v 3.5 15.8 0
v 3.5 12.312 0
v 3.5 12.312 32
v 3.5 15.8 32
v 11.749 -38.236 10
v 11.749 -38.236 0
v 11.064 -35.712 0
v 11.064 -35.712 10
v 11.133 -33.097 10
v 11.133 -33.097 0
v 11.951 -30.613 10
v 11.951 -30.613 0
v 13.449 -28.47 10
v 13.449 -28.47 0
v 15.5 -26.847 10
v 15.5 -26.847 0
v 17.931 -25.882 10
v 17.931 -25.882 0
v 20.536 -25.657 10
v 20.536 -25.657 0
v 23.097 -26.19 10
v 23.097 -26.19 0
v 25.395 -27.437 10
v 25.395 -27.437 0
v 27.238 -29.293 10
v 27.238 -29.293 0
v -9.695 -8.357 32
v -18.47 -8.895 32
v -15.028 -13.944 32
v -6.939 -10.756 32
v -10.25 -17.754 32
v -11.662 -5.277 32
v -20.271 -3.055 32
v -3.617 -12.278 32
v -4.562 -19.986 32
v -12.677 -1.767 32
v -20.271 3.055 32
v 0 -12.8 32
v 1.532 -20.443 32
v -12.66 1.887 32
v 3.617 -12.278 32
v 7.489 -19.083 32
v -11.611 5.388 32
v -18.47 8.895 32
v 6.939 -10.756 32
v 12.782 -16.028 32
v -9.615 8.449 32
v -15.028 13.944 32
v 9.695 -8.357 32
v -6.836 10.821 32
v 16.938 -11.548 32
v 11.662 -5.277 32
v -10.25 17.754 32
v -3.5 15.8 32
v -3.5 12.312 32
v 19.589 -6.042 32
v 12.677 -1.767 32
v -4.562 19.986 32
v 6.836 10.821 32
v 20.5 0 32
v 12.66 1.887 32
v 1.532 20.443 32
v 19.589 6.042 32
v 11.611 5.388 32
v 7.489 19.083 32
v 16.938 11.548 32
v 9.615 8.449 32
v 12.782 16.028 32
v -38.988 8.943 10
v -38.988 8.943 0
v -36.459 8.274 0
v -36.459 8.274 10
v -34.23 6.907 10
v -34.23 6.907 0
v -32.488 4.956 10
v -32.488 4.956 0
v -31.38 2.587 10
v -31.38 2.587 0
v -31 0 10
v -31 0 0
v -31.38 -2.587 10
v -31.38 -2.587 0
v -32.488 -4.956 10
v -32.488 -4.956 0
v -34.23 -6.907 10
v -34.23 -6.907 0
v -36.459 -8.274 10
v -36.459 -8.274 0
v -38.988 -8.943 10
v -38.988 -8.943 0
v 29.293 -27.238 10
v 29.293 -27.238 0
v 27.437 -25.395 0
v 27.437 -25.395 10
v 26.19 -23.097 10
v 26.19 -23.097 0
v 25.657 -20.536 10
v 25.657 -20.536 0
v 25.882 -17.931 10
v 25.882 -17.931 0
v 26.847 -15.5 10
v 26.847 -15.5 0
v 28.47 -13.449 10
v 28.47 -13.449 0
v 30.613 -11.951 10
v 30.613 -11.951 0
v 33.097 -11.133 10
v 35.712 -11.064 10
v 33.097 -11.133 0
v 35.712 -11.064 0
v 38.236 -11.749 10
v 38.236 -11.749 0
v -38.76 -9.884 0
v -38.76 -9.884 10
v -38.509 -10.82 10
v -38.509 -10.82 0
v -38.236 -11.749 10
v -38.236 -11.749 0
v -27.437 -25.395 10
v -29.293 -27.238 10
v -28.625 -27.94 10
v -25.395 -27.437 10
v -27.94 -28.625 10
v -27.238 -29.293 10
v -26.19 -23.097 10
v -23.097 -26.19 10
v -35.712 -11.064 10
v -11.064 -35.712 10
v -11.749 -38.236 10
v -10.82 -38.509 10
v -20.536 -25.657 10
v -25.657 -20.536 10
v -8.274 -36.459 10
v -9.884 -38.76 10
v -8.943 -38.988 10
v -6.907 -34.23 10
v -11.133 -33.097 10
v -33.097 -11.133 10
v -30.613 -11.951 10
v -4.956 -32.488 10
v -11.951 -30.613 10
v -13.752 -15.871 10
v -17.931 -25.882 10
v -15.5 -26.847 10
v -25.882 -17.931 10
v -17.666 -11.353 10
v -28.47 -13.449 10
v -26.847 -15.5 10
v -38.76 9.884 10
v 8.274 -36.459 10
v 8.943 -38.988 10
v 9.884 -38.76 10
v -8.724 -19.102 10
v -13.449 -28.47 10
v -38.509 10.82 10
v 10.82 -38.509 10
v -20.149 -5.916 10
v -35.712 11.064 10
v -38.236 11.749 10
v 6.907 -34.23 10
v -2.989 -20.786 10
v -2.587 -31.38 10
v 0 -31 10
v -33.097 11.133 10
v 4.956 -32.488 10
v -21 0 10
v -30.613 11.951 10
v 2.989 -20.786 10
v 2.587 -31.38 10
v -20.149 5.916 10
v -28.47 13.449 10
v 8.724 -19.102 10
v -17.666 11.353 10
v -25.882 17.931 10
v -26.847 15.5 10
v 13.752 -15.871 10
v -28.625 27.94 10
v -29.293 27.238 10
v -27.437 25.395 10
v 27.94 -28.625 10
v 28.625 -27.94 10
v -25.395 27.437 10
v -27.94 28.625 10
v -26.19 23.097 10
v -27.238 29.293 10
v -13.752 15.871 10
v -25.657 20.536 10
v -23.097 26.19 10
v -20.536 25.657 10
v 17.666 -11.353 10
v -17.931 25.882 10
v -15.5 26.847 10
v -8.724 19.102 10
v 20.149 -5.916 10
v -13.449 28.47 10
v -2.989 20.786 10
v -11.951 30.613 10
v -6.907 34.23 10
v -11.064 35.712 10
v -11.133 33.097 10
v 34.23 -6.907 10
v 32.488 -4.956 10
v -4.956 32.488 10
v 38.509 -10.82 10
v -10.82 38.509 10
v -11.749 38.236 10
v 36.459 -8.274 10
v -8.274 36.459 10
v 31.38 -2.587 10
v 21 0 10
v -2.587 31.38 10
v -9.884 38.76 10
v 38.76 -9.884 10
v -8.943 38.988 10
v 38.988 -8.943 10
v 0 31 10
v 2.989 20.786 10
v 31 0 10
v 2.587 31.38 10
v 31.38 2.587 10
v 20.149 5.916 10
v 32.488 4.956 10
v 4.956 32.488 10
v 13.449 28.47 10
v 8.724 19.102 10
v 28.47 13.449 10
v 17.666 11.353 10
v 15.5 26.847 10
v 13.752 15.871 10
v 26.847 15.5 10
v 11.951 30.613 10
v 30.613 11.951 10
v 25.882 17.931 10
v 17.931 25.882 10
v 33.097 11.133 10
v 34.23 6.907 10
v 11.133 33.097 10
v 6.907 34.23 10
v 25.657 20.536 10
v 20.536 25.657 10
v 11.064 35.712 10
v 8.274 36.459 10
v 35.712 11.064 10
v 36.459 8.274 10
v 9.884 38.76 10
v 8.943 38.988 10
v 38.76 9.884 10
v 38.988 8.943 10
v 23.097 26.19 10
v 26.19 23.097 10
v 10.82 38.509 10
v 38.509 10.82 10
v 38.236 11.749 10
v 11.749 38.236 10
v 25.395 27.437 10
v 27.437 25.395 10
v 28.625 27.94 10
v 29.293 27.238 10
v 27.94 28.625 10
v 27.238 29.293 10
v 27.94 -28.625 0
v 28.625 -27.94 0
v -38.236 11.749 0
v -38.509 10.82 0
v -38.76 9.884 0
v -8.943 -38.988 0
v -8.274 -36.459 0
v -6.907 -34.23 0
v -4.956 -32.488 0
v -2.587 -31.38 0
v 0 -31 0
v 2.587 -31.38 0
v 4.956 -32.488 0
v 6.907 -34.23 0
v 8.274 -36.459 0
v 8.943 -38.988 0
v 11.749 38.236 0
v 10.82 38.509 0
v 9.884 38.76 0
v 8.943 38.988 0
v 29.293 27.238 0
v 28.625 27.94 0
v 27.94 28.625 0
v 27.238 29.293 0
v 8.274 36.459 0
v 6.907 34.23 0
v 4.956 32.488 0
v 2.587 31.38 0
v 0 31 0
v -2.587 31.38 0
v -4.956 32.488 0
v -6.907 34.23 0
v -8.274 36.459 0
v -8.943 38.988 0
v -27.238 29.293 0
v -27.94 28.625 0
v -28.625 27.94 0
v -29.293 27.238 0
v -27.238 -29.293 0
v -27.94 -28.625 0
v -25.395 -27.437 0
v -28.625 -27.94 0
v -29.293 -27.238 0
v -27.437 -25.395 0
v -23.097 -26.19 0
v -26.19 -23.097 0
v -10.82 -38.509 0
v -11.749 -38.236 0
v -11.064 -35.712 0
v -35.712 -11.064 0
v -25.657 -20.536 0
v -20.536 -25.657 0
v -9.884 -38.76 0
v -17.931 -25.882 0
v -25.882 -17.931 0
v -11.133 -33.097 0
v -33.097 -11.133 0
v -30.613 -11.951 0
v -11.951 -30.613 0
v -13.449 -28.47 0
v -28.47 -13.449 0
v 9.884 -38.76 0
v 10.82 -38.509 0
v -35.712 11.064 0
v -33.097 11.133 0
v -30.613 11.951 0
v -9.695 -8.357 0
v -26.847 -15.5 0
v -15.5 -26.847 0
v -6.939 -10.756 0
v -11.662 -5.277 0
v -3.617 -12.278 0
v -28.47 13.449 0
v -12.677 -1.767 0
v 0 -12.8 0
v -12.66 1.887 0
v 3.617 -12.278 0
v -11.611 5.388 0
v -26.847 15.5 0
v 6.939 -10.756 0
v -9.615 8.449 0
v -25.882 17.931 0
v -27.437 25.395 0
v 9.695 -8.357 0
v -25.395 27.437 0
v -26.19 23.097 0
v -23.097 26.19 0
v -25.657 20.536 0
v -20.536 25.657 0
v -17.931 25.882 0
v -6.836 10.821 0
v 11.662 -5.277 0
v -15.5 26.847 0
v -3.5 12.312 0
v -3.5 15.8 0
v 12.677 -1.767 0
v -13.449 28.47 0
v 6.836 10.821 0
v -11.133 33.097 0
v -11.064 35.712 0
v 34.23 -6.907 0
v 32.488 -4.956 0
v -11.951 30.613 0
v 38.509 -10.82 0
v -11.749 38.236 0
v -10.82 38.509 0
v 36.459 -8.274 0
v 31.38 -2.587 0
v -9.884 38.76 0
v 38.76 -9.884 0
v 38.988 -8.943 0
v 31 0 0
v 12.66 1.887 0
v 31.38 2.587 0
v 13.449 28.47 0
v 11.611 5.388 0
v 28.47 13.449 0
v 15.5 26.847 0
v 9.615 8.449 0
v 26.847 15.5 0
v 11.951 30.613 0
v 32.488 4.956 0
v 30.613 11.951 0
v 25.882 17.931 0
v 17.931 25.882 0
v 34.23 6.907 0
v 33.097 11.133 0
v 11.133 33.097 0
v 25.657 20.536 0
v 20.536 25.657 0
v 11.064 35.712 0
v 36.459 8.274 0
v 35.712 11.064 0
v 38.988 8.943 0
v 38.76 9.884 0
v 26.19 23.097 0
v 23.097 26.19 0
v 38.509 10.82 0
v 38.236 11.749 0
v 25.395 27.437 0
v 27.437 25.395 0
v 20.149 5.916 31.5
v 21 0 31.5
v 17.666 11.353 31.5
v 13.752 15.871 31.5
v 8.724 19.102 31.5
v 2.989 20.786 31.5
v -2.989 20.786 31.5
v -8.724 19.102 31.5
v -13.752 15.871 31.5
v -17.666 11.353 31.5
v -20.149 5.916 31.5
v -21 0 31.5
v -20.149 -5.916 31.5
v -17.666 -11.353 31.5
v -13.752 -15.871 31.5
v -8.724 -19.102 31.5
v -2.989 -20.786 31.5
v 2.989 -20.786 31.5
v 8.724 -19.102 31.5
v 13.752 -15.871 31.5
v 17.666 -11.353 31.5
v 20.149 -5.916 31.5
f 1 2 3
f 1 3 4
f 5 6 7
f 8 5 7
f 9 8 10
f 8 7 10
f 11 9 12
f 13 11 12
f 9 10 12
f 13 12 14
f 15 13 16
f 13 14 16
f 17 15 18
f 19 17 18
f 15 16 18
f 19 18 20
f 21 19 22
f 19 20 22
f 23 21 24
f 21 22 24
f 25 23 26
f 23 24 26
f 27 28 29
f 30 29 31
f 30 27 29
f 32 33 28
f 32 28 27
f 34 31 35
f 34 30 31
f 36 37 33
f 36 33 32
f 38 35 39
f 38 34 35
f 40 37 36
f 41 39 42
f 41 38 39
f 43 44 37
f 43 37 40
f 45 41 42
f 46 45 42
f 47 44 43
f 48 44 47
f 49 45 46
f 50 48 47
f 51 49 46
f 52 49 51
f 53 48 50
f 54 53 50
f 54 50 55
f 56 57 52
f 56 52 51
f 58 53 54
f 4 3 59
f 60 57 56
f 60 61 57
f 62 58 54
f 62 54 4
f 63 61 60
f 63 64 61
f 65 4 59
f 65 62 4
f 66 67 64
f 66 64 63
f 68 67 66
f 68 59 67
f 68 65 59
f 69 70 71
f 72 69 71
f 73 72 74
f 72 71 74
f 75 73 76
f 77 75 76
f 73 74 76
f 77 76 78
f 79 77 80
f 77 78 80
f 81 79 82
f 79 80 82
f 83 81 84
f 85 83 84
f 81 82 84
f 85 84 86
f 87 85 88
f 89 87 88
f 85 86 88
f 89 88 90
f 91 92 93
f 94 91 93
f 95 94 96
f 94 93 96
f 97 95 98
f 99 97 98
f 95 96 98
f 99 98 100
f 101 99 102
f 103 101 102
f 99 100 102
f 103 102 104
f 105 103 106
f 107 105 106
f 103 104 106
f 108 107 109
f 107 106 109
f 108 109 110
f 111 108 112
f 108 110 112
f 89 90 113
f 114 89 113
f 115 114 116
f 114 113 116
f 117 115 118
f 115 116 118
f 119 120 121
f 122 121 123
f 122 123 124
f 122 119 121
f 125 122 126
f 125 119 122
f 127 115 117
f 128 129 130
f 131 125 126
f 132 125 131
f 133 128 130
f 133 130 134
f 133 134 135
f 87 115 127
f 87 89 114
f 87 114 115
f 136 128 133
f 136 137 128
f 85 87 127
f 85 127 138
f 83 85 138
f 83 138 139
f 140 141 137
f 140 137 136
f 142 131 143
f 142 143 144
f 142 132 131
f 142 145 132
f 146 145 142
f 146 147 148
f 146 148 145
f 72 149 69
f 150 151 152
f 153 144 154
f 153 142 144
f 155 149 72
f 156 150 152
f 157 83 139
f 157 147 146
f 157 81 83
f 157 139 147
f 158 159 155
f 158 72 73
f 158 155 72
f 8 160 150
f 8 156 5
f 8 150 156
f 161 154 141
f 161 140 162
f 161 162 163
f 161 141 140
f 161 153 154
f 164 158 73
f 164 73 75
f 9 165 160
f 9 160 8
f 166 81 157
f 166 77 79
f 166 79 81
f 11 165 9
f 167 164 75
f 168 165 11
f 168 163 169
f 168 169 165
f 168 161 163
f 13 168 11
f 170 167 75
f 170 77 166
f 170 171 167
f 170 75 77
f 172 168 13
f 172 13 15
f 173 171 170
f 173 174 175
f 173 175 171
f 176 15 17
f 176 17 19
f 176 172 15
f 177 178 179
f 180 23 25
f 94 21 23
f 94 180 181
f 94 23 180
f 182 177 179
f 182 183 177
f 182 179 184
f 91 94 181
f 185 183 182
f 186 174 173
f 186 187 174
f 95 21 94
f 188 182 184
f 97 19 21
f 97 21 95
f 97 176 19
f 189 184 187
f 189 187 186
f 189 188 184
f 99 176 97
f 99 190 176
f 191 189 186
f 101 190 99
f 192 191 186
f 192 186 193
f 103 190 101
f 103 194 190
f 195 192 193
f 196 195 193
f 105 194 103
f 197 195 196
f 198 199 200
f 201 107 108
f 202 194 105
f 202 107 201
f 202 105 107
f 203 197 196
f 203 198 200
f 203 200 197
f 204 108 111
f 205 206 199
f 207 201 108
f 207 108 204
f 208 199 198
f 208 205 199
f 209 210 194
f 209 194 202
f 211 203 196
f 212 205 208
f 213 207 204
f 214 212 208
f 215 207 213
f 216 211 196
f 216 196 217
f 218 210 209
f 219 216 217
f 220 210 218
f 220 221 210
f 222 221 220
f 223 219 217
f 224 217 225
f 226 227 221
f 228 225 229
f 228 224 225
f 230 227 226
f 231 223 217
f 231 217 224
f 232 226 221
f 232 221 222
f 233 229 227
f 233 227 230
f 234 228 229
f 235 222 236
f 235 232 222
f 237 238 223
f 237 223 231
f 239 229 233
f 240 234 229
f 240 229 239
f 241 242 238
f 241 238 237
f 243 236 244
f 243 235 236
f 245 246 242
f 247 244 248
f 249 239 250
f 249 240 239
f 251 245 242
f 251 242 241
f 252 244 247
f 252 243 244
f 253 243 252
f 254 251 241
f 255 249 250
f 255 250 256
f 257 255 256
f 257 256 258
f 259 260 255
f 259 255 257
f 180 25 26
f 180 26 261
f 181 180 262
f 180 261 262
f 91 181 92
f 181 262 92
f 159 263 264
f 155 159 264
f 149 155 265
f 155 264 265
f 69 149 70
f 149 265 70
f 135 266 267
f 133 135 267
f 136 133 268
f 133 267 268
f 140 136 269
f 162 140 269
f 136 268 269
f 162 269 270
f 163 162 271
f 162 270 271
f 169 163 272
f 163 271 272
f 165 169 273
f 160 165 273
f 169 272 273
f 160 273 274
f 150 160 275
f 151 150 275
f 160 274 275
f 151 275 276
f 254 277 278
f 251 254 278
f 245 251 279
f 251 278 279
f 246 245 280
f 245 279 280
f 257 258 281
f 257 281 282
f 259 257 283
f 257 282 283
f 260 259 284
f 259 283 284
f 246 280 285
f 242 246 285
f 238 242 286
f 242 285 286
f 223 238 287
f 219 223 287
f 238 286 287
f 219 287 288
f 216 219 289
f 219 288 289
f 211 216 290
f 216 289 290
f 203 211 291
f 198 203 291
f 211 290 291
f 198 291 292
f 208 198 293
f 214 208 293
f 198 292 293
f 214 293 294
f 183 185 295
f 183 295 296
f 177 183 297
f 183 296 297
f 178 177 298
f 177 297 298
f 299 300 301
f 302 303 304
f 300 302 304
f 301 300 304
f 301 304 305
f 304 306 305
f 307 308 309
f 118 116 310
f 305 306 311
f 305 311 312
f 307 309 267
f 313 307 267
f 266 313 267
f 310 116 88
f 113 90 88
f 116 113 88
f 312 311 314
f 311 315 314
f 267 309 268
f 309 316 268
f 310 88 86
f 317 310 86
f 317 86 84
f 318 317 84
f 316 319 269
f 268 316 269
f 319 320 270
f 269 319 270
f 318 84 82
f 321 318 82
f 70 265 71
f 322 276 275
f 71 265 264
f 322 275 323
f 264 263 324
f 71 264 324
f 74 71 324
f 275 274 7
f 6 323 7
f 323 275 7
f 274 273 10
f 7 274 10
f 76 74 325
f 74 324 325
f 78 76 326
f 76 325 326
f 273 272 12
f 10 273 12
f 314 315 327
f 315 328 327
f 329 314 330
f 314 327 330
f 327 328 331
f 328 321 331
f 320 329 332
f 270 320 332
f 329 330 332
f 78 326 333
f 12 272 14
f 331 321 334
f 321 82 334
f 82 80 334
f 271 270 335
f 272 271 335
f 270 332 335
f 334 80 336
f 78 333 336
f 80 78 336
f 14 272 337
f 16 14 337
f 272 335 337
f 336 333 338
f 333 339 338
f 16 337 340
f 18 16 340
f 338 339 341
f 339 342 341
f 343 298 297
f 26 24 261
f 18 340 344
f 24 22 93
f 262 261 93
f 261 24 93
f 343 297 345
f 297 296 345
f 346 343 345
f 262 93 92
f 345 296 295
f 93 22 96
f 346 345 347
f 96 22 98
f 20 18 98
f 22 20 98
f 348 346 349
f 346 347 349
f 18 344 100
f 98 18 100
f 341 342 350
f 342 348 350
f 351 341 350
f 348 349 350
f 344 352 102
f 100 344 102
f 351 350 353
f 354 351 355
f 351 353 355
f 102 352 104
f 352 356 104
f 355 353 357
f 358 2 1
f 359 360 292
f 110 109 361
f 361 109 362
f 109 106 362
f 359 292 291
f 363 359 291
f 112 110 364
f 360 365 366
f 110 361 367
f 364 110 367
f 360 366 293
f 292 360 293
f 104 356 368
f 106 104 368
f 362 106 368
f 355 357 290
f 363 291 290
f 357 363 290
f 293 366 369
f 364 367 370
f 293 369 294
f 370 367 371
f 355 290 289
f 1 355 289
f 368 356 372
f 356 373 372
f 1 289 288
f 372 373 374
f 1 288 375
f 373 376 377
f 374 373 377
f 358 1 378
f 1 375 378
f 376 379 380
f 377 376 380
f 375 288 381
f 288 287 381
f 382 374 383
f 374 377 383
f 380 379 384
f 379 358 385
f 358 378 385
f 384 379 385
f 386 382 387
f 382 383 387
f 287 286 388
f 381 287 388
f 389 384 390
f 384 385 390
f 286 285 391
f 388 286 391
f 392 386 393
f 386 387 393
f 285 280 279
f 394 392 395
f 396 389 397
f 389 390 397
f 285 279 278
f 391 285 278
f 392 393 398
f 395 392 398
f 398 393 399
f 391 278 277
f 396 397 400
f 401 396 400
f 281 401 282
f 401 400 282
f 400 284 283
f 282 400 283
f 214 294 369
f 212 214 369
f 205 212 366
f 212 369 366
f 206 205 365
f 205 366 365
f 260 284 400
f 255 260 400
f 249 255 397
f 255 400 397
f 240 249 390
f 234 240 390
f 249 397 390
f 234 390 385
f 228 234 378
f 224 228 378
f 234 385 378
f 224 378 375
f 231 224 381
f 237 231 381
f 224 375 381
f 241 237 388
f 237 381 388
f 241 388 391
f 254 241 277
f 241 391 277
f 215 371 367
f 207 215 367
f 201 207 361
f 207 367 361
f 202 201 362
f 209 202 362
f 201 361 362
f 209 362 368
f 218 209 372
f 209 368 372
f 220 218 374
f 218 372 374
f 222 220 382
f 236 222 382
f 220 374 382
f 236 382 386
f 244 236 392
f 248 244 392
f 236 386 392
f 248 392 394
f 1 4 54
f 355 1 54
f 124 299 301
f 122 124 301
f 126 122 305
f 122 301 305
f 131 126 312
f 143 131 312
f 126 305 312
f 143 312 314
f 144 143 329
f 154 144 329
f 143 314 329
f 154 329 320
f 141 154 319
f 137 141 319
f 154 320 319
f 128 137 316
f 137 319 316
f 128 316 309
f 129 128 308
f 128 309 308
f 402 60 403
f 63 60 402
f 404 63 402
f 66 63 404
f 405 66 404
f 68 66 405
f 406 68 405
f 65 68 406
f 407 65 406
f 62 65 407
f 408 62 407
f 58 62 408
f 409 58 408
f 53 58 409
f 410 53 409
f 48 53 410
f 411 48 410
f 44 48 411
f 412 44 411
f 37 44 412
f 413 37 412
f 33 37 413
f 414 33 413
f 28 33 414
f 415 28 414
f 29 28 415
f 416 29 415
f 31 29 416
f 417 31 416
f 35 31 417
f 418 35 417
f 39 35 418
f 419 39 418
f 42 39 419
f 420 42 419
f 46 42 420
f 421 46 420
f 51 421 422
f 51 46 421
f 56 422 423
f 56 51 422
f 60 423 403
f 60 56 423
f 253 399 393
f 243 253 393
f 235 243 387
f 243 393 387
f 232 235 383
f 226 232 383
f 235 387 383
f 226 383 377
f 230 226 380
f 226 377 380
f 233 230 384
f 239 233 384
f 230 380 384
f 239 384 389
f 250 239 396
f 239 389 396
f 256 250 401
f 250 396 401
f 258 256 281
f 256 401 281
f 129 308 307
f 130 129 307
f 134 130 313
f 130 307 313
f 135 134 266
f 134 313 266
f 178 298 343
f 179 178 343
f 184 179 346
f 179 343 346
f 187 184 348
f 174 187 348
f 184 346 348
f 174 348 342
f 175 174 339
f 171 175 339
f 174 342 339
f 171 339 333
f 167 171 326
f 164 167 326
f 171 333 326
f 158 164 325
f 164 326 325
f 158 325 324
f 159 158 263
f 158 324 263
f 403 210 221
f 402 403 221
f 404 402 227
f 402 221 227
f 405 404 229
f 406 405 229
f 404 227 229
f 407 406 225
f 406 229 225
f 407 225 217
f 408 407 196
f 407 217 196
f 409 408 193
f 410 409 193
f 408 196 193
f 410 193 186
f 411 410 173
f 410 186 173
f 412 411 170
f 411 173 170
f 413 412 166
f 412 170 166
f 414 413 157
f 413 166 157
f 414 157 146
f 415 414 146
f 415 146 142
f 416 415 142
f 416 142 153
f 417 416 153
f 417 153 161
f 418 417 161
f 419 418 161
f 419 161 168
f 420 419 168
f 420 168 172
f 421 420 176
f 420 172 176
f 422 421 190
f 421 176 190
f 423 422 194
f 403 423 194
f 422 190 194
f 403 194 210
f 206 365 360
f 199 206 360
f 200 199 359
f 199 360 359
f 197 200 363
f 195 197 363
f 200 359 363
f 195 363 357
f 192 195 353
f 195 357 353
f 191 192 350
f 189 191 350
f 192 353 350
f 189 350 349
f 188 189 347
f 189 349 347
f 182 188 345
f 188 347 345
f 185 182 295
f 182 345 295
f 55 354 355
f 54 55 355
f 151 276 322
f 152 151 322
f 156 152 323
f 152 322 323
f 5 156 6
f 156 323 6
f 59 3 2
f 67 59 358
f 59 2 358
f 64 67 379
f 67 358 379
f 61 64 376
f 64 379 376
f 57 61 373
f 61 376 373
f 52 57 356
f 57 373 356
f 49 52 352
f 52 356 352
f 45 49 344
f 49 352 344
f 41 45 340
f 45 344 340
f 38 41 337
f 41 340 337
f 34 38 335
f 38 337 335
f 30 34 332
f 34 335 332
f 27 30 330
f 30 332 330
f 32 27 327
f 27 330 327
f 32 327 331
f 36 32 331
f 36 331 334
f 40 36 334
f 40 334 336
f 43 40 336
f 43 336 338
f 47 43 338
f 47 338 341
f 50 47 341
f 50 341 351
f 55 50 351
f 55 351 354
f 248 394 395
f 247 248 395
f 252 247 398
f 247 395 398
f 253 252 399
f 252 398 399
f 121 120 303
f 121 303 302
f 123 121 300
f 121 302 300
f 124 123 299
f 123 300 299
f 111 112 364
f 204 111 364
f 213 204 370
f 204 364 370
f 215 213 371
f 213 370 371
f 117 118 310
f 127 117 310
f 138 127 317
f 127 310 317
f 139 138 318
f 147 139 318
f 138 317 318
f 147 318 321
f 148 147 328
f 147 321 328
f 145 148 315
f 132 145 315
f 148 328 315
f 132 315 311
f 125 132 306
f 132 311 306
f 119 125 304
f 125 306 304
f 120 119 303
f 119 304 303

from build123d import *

# Parameters (mm, degrees)
P_IDAT_VYSUNUT_M2_DEPTH  = 10
SKICA2_R                 = 21
P_IDAT_VYSUNUT_M3_DEPTH  = 22
SKICA3_R                 = 12.8
SKICA3_W                 = 7
SKICA3_H                 = 3.487810918
ODEBRAT_VYSUNUT_M1_DEPTH = 61
ZKOSEN_3_SIZE            = 0.5


with BuildPart() as part:
    # Skica1 → Přidat vysunutím2 (new body)
    with BuildSketch(Plane.XY):
        with BuildLine():
            ThreePointArc((38.9875, -8.942865522), (31, 0), (38.9875, 8.942865522))
            ThreePointArc((38.9875, 8.942865522), (38.637033052, 10.352761804), (38.235598191, 11.749001275))
            ThreePointArc((38.235598191, 11.749001275), (26.846787517, 15.5), (29.292732669, 27.238498725))
            ThreePointArc((29.292732669, 27.238498725), (28.284271247, 28.284271247), (27.238498725, 29.292732669))
            ThreePointArc((27.238498725, 29.292732669), (15.5, 26.846787517), (11.749001275, 38.235598191))
            ThreePointArc((11.749001275, 38.235598191), (10.352761804, 38.637033052), (8.942865522, 38.9875))
            ThreePointArc((8.942865522, 38.9875), (0, 31), (-8.942865522, 38.9875))
            ThreePointArc((-8.942865522, 38.9875), (-10.352761804, 38.637033052), (-11.749001275, 38.235598191))
            ThreePointArc((-11.749001275, 38.235598191), (-15.5, 26.846787517), (-27.238498725, 29.292732669))
            ThreePointArc((-27.238498725, 29.292732669), (-28.284271247, 28.284271247), (-29.292732669, 27.238498725))
            ThreePointArc((-29.292732669, 27.238498725), (-26.846787517, 15.5), (-38.235598191, 11.749001275))
            ThreePointArc((-38.235598191, 11.749001275), (-38.637033052, 10.352761804), (-38.9875, 8.942865522))
            ThreePointArc((-38.9875, 8.942865522), (-31, 0), (-38.9875, -8.942865522))
            ThreePointArc((-38.9875, -8.942865522), (-38.637033052, -10.352761804), (-38.235598191, -11.749001275))
            ThreePointArc((-38.235598191, -11.749001275), (-26.846787517, -15.5), (-29.292732669, -27.238498725))
            ThreePointArc((-29.292732669, -27.238498725), (-28.284271247, -28.284271247), (-27.238498725, -29.292732669))
            ThreePointArc((-27.238498725, -29.292732669), (-15.5, -26.846787517), (-11.749001275, -38.235598191))
            ThreePointArc((-11.749001275, -38.235598191), (-10.352761804, -38.637033052), (-8.942865522, -38.9875))
            ThreePointArc((-8.942865522, -38.9875), (0, -31), (8.942865522, -38.9875))
            ThreePointArc((8.942865522, -38.9875), (10.352761804, -38.637033052), (11.749001275, -38.235598191))
            ThreePointArc((11.749001275, -38.235598191), (15.5, -26.846787517), (27.238498725, -29.292732669))
            ThreePointArc((27.238498725, -29.292732669), (28.284271247, -28.284271247), (29.292732669, -27.238498725))
            ThreePointArc((29.292732669, -27.238498725), (26.846787517, -15.5), (38.235598191, -11.749001275))
            ThreePointArc((38.235598191, -11.749001275), (38.637033052, -10.352761804), (38.9875, -8.942865522))
        make_face()
        with BuildLine():
            Line((-3.5, 12.312189082), (-3.5, 15.8))
            Line((-3.5, 15.8), (3.5, 15.8))
            Line((3.5, 15.8), (3.5, 12.312189082))
            ThreePointArc((3.5, 12.312189082), (0, -12.8), (-3.5, 12.312189082))
        make_face(mode=Mode.SUBTRACT)
    extrude(amount=P_IDAT_VYSUNUT_M2_DEPTH)

    # Skica2 → Přidat vysunutím3 (add)
    with BuildSketch(Plane.XY.offset(10)):
        Circle(SKICA2_R)
    extrude(amount=P_IDAT_VYSUNUT_M3_DEPTH)

    # Skica3 → Odebrat vysunutím1 (cut)
    with BuildSketch(Plane(origin=(0, 0, 0), x_dir=(-1, 0, 0), z_dir=(0, 0, -1))):
        Circle(SKICA3_R)
        with Locations((0, 14.056094541)):
            Rectangle(SKICA3_W, SKICA3_H)
    extrude(amount=-ODEBRAT_VYSUNUT_M1_DEPTH, mode=Mode.SUBTRACT)

    # Zkosení3
    zkosen_3_edges = [part.edges().sort_by_distance(p)[0] for p in [
        (-21, 0, 32),
    ]]
    chamfer(zkosen_3_edges, length=ZKOSEN_3_SIZE)


solid = part.part
